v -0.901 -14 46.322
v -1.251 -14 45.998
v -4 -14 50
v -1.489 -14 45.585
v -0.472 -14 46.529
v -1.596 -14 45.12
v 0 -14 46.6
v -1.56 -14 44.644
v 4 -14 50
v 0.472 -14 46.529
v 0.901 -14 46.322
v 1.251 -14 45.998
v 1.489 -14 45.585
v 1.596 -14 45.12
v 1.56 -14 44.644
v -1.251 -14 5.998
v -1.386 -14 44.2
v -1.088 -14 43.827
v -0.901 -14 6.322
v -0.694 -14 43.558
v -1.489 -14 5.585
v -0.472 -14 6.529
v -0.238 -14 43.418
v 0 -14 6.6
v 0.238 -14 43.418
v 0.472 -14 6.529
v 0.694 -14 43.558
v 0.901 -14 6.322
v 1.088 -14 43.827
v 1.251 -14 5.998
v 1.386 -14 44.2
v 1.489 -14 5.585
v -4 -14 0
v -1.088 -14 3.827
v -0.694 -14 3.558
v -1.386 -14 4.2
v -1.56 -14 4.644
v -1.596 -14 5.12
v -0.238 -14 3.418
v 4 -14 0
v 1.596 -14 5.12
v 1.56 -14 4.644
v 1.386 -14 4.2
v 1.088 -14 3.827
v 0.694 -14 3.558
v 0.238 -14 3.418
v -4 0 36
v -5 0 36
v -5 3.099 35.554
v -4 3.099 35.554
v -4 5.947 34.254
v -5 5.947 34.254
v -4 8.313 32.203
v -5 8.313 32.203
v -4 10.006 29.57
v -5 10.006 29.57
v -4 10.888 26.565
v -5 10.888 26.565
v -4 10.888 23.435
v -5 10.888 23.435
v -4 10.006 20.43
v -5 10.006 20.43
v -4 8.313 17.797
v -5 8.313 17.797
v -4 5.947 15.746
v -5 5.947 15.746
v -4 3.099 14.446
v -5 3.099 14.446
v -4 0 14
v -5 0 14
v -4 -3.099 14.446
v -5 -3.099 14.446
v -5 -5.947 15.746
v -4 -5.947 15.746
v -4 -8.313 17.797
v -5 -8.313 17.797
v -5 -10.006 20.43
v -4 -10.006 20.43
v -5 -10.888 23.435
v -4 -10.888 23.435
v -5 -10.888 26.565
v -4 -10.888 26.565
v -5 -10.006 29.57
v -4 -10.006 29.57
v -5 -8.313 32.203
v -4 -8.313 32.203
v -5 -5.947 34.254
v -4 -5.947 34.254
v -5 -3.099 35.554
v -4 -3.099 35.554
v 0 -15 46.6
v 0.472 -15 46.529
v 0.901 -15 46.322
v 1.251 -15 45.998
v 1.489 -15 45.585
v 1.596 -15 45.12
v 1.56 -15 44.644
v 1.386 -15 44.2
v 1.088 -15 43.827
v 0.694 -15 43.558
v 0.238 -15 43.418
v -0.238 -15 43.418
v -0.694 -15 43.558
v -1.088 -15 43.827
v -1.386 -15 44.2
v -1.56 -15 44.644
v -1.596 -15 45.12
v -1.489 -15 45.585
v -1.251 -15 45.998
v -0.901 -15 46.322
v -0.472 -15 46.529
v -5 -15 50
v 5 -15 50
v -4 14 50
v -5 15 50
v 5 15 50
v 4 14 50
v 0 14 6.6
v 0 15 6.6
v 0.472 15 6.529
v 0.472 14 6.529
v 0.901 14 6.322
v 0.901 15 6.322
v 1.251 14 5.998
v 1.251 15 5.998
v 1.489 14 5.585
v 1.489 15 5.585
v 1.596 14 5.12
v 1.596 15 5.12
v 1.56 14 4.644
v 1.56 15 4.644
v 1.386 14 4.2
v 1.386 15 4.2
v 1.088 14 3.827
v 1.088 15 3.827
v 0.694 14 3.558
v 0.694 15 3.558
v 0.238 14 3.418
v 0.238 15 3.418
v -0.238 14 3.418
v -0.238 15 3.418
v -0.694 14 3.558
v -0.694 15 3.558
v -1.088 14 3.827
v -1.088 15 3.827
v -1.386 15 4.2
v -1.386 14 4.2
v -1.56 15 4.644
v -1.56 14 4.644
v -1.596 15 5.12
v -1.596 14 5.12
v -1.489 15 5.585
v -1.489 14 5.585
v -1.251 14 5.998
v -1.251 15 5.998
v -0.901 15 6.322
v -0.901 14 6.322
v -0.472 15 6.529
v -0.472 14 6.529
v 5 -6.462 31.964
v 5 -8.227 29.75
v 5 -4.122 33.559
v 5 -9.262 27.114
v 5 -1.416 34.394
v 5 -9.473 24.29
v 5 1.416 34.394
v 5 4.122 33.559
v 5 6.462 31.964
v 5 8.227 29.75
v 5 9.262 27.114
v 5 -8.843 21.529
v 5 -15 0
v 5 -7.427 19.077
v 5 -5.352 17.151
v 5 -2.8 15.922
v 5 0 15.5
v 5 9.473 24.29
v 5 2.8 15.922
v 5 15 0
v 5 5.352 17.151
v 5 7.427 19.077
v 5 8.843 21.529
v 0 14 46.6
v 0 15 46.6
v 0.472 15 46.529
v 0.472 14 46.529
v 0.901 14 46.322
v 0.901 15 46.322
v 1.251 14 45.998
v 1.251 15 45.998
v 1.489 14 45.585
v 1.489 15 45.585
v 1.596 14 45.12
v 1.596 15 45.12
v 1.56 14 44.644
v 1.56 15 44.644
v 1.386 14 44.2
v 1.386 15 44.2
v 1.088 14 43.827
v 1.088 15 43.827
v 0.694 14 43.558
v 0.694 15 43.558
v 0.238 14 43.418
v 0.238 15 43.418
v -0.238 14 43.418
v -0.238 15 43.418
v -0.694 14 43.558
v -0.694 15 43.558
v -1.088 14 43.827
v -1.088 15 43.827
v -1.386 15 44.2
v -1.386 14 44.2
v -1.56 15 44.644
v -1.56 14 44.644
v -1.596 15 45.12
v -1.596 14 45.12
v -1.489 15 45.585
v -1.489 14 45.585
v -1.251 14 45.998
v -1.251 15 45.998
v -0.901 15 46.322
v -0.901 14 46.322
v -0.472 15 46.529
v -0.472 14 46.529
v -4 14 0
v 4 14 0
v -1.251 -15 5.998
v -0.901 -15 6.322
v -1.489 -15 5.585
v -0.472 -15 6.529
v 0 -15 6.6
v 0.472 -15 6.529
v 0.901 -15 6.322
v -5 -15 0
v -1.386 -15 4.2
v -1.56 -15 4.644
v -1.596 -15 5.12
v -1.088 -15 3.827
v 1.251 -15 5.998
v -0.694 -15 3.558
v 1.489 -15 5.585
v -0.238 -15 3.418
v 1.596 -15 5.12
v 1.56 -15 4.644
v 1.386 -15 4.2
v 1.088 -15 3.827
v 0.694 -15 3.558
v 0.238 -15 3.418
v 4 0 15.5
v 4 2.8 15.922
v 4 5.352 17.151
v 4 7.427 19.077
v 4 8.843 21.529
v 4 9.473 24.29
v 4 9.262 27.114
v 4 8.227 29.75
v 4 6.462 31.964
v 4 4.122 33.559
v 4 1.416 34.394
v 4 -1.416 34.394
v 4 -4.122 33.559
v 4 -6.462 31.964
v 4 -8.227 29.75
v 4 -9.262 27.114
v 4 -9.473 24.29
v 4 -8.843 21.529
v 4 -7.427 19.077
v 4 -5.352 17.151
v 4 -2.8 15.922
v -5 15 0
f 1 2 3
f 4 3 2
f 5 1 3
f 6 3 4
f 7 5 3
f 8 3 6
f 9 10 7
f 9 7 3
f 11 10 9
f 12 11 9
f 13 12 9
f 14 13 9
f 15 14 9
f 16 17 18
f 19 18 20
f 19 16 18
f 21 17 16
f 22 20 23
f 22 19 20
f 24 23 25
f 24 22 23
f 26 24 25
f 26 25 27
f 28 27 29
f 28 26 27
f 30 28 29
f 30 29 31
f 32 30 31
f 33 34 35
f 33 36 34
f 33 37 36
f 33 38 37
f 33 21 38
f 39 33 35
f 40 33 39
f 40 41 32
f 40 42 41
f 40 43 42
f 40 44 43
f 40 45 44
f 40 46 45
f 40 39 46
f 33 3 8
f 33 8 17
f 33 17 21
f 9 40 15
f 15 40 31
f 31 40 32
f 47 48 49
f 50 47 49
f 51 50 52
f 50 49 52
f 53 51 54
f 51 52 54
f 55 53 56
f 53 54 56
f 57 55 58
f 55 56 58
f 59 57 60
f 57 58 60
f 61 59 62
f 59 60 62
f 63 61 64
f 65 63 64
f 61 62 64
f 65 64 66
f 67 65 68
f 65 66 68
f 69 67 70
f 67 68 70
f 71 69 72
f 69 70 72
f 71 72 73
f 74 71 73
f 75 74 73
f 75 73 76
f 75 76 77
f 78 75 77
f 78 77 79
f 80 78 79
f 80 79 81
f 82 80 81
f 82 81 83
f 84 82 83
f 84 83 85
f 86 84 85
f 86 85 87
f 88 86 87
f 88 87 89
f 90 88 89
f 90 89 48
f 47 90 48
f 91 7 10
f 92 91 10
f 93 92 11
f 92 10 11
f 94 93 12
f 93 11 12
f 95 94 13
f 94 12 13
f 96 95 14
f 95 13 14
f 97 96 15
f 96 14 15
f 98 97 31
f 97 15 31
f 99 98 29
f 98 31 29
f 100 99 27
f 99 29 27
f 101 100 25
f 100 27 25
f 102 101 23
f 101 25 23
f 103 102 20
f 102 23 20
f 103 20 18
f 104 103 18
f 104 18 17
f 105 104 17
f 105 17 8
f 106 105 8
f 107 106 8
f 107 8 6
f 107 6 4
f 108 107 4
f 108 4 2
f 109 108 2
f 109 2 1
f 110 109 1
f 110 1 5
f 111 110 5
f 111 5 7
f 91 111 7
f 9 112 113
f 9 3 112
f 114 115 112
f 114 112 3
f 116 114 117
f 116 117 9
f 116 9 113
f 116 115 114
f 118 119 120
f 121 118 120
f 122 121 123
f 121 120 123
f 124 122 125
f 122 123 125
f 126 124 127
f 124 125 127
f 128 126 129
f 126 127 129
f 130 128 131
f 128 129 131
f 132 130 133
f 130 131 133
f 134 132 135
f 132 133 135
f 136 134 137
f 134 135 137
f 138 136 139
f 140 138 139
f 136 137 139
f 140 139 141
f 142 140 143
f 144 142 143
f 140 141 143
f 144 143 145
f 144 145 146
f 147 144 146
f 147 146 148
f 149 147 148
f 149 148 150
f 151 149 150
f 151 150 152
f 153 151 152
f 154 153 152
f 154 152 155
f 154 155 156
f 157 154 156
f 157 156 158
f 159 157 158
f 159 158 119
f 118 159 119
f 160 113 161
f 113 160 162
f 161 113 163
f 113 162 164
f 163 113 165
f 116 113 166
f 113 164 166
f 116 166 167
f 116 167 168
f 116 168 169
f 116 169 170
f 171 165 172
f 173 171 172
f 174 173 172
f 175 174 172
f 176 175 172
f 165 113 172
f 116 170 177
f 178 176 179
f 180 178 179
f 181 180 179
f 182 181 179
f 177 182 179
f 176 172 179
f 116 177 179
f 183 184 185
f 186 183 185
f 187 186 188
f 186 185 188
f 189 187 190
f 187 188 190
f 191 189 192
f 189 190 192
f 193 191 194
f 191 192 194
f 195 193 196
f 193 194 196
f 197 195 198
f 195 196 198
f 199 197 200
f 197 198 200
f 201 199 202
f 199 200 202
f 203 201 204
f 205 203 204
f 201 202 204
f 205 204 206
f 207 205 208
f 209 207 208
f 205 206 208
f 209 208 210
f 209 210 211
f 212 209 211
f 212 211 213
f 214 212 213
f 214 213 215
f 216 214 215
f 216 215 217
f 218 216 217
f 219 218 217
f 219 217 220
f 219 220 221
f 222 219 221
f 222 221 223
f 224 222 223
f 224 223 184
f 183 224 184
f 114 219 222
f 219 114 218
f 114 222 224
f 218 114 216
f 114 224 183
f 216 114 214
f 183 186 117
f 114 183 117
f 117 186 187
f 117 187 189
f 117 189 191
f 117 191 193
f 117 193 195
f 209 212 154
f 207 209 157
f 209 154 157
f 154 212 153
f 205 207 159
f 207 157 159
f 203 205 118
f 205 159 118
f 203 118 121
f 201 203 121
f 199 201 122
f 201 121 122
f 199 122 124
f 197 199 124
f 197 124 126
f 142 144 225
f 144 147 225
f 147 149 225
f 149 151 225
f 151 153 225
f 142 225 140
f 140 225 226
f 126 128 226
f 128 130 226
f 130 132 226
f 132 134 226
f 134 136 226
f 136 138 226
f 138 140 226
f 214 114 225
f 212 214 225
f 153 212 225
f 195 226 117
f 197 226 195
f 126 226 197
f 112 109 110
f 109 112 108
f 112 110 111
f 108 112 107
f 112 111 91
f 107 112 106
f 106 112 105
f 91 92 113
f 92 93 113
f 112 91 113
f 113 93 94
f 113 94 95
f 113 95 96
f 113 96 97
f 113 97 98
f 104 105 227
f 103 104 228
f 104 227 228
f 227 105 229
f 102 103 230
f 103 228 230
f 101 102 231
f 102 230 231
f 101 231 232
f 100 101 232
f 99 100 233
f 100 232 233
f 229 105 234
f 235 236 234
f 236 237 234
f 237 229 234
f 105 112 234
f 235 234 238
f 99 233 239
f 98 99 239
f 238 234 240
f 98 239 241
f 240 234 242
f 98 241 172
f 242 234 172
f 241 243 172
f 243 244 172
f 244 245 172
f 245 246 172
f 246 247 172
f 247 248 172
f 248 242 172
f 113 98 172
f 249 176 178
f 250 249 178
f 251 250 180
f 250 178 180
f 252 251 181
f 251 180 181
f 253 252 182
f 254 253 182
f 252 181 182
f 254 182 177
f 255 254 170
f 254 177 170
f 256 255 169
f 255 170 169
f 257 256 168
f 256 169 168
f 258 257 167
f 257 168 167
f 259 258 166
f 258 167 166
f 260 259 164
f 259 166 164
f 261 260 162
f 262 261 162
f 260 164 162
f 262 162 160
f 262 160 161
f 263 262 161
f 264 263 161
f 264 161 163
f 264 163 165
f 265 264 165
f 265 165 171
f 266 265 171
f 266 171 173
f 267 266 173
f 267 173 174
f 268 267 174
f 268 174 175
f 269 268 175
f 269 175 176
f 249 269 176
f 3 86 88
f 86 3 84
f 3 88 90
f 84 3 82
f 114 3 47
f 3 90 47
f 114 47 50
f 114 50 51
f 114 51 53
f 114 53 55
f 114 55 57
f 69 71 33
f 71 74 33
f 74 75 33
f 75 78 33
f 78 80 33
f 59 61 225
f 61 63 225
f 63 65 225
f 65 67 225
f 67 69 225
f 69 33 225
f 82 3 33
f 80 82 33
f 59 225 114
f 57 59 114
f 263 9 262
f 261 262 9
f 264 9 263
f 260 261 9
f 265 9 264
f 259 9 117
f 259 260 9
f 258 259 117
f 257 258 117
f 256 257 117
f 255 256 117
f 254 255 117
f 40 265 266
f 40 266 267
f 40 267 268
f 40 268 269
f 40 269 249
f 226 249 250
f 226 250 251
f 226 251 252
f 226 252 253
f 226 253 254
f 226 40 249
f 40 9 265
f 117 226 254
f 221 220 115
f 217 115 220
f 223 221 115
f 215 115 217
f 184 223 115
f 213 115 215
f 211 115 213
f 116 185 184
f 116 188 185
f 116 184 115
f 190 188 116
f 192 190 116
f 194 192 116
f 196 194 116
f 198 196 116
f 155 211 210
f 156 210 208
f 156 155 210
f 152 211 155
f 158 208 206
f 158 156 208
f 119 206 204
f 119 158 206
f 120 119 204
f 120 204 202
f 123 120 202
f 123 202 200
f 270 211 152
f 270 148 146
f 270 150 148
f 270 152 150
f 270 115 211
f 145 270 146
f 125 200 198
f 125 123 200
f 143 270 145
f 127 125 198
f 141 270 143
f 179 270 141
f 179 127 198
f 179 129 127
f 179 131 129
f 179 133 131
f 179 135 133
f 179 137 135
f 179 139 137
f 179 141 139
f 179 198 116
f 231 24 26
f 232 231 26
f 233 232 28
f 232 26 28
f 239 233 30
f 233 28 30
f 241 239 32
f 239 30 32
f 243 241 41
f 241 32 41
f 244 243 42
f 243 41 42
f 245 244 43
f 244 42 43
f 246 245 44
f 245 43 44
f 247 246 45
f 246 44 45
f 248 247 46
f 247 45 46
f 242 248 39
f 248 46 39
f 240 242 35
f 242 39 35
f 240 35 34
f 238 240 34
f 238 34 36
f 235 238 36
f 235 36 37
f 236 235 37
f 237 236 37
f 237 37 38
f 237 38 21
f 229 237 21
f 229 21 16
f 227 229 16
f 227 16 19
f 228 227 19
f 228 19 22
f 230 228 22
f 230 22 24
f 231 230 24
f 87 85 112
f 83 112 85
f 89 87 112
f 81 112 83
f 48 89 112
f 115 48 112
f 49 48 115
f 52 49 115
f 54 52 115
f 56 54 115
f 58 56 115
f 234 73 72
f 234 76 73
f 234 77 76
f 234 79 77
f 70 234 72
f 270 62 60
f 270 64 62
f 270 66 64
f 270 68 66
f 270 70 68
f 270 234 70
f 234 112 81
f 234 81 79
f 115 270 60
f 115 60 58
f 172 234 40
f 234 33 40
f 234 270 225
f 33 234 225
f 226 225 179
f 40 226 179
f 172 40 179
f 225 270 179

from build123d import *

# Parameters (mm, degrees)
SKETCH_289_W           = 10
SKETCH_289_H           = 30
SKETCH_289_W_2         = 8
SKETCH_289_H_2         = 28
EXTRUDE_359_DEPTH      = 50
SKETCH_433_R           = 1.6
CUT_EXTRUDE_966_DEPTH  = 59.523499554
SKETCH_661_R           = 9.5
CUT_EXTRUDE_1010_DEPTH = 54.150729064
CUT_EXTRUDE_1_REACH    = 55.151
SKETCH_1_R             = 11


with BuildPart() as part:
    # Sketch 289 → Extrude 359 (new body)
    with BuildSketch(Plane.XY):
        Rectangle(SKETCH_289_W, SKETCH_289_H)
        Rectangle(SKETCH_289_W_2, SKETCH_289_H_2, mode=Mode.SUBTRACT)
    extrude(amount=EXTRUDE_359_DEPTH)

    # Sketch 433 → Cut-Extrude 966 (cut, through all)
    with BuildSketch(Plane(origin=(0, 15, 0), x_dir=(1, 0, 0), z_dir=(0, 1, 0))):
        with Locations(Location((0, -5, 0), (0, 0, 270))):
            Circle(SKETCH_433_R)
        with Locations(Location((0, -45, 0), (0, 0, 270))):
            Circle(SKETCH_433_R)
    extrude(amount=-CUT_EXTRUDE_966_DEPTH, mode=Mode.SUBTRACT)

    # Sketch 661 → Cut-Extrude 1010 (cut, through all)
    with BuildSketch(Plane(origin=(5, 0, 0), x_dir=(0, 0, -1), z_dir=(1, 0, 0))):
        with Locations((-25, 0)):
            Circle(SKETCH_661_R)
    extrude(amount=-CUT_EXTRUDE_1010_DEPTH, mode=Mode.SUBTRACT)

    # ｽｹｯﾁ1 → ｶｯﾄ - 押し出し1 (cut, up to next)
    with BuildSketch(Plane.ZY.offset(5), mode=Mode.PRIVATE) as cut_extrude_1_sk1:
        with Locations((25, 0)):
            Circle(SKETCH_1_R)
    cut_extrude_1_tool1 = extrude(cut_extrude_1_sk1.sketch, amount=-CUT_EXTRUDE_1_REACH, mode=Mode.PRIVATE) & part.part
    add(cut_extrude_1_tool1.solids().sort_by_distance((-5, 0, 25))[0], mode=Mode.SUBTRACT)


solid = part.part
